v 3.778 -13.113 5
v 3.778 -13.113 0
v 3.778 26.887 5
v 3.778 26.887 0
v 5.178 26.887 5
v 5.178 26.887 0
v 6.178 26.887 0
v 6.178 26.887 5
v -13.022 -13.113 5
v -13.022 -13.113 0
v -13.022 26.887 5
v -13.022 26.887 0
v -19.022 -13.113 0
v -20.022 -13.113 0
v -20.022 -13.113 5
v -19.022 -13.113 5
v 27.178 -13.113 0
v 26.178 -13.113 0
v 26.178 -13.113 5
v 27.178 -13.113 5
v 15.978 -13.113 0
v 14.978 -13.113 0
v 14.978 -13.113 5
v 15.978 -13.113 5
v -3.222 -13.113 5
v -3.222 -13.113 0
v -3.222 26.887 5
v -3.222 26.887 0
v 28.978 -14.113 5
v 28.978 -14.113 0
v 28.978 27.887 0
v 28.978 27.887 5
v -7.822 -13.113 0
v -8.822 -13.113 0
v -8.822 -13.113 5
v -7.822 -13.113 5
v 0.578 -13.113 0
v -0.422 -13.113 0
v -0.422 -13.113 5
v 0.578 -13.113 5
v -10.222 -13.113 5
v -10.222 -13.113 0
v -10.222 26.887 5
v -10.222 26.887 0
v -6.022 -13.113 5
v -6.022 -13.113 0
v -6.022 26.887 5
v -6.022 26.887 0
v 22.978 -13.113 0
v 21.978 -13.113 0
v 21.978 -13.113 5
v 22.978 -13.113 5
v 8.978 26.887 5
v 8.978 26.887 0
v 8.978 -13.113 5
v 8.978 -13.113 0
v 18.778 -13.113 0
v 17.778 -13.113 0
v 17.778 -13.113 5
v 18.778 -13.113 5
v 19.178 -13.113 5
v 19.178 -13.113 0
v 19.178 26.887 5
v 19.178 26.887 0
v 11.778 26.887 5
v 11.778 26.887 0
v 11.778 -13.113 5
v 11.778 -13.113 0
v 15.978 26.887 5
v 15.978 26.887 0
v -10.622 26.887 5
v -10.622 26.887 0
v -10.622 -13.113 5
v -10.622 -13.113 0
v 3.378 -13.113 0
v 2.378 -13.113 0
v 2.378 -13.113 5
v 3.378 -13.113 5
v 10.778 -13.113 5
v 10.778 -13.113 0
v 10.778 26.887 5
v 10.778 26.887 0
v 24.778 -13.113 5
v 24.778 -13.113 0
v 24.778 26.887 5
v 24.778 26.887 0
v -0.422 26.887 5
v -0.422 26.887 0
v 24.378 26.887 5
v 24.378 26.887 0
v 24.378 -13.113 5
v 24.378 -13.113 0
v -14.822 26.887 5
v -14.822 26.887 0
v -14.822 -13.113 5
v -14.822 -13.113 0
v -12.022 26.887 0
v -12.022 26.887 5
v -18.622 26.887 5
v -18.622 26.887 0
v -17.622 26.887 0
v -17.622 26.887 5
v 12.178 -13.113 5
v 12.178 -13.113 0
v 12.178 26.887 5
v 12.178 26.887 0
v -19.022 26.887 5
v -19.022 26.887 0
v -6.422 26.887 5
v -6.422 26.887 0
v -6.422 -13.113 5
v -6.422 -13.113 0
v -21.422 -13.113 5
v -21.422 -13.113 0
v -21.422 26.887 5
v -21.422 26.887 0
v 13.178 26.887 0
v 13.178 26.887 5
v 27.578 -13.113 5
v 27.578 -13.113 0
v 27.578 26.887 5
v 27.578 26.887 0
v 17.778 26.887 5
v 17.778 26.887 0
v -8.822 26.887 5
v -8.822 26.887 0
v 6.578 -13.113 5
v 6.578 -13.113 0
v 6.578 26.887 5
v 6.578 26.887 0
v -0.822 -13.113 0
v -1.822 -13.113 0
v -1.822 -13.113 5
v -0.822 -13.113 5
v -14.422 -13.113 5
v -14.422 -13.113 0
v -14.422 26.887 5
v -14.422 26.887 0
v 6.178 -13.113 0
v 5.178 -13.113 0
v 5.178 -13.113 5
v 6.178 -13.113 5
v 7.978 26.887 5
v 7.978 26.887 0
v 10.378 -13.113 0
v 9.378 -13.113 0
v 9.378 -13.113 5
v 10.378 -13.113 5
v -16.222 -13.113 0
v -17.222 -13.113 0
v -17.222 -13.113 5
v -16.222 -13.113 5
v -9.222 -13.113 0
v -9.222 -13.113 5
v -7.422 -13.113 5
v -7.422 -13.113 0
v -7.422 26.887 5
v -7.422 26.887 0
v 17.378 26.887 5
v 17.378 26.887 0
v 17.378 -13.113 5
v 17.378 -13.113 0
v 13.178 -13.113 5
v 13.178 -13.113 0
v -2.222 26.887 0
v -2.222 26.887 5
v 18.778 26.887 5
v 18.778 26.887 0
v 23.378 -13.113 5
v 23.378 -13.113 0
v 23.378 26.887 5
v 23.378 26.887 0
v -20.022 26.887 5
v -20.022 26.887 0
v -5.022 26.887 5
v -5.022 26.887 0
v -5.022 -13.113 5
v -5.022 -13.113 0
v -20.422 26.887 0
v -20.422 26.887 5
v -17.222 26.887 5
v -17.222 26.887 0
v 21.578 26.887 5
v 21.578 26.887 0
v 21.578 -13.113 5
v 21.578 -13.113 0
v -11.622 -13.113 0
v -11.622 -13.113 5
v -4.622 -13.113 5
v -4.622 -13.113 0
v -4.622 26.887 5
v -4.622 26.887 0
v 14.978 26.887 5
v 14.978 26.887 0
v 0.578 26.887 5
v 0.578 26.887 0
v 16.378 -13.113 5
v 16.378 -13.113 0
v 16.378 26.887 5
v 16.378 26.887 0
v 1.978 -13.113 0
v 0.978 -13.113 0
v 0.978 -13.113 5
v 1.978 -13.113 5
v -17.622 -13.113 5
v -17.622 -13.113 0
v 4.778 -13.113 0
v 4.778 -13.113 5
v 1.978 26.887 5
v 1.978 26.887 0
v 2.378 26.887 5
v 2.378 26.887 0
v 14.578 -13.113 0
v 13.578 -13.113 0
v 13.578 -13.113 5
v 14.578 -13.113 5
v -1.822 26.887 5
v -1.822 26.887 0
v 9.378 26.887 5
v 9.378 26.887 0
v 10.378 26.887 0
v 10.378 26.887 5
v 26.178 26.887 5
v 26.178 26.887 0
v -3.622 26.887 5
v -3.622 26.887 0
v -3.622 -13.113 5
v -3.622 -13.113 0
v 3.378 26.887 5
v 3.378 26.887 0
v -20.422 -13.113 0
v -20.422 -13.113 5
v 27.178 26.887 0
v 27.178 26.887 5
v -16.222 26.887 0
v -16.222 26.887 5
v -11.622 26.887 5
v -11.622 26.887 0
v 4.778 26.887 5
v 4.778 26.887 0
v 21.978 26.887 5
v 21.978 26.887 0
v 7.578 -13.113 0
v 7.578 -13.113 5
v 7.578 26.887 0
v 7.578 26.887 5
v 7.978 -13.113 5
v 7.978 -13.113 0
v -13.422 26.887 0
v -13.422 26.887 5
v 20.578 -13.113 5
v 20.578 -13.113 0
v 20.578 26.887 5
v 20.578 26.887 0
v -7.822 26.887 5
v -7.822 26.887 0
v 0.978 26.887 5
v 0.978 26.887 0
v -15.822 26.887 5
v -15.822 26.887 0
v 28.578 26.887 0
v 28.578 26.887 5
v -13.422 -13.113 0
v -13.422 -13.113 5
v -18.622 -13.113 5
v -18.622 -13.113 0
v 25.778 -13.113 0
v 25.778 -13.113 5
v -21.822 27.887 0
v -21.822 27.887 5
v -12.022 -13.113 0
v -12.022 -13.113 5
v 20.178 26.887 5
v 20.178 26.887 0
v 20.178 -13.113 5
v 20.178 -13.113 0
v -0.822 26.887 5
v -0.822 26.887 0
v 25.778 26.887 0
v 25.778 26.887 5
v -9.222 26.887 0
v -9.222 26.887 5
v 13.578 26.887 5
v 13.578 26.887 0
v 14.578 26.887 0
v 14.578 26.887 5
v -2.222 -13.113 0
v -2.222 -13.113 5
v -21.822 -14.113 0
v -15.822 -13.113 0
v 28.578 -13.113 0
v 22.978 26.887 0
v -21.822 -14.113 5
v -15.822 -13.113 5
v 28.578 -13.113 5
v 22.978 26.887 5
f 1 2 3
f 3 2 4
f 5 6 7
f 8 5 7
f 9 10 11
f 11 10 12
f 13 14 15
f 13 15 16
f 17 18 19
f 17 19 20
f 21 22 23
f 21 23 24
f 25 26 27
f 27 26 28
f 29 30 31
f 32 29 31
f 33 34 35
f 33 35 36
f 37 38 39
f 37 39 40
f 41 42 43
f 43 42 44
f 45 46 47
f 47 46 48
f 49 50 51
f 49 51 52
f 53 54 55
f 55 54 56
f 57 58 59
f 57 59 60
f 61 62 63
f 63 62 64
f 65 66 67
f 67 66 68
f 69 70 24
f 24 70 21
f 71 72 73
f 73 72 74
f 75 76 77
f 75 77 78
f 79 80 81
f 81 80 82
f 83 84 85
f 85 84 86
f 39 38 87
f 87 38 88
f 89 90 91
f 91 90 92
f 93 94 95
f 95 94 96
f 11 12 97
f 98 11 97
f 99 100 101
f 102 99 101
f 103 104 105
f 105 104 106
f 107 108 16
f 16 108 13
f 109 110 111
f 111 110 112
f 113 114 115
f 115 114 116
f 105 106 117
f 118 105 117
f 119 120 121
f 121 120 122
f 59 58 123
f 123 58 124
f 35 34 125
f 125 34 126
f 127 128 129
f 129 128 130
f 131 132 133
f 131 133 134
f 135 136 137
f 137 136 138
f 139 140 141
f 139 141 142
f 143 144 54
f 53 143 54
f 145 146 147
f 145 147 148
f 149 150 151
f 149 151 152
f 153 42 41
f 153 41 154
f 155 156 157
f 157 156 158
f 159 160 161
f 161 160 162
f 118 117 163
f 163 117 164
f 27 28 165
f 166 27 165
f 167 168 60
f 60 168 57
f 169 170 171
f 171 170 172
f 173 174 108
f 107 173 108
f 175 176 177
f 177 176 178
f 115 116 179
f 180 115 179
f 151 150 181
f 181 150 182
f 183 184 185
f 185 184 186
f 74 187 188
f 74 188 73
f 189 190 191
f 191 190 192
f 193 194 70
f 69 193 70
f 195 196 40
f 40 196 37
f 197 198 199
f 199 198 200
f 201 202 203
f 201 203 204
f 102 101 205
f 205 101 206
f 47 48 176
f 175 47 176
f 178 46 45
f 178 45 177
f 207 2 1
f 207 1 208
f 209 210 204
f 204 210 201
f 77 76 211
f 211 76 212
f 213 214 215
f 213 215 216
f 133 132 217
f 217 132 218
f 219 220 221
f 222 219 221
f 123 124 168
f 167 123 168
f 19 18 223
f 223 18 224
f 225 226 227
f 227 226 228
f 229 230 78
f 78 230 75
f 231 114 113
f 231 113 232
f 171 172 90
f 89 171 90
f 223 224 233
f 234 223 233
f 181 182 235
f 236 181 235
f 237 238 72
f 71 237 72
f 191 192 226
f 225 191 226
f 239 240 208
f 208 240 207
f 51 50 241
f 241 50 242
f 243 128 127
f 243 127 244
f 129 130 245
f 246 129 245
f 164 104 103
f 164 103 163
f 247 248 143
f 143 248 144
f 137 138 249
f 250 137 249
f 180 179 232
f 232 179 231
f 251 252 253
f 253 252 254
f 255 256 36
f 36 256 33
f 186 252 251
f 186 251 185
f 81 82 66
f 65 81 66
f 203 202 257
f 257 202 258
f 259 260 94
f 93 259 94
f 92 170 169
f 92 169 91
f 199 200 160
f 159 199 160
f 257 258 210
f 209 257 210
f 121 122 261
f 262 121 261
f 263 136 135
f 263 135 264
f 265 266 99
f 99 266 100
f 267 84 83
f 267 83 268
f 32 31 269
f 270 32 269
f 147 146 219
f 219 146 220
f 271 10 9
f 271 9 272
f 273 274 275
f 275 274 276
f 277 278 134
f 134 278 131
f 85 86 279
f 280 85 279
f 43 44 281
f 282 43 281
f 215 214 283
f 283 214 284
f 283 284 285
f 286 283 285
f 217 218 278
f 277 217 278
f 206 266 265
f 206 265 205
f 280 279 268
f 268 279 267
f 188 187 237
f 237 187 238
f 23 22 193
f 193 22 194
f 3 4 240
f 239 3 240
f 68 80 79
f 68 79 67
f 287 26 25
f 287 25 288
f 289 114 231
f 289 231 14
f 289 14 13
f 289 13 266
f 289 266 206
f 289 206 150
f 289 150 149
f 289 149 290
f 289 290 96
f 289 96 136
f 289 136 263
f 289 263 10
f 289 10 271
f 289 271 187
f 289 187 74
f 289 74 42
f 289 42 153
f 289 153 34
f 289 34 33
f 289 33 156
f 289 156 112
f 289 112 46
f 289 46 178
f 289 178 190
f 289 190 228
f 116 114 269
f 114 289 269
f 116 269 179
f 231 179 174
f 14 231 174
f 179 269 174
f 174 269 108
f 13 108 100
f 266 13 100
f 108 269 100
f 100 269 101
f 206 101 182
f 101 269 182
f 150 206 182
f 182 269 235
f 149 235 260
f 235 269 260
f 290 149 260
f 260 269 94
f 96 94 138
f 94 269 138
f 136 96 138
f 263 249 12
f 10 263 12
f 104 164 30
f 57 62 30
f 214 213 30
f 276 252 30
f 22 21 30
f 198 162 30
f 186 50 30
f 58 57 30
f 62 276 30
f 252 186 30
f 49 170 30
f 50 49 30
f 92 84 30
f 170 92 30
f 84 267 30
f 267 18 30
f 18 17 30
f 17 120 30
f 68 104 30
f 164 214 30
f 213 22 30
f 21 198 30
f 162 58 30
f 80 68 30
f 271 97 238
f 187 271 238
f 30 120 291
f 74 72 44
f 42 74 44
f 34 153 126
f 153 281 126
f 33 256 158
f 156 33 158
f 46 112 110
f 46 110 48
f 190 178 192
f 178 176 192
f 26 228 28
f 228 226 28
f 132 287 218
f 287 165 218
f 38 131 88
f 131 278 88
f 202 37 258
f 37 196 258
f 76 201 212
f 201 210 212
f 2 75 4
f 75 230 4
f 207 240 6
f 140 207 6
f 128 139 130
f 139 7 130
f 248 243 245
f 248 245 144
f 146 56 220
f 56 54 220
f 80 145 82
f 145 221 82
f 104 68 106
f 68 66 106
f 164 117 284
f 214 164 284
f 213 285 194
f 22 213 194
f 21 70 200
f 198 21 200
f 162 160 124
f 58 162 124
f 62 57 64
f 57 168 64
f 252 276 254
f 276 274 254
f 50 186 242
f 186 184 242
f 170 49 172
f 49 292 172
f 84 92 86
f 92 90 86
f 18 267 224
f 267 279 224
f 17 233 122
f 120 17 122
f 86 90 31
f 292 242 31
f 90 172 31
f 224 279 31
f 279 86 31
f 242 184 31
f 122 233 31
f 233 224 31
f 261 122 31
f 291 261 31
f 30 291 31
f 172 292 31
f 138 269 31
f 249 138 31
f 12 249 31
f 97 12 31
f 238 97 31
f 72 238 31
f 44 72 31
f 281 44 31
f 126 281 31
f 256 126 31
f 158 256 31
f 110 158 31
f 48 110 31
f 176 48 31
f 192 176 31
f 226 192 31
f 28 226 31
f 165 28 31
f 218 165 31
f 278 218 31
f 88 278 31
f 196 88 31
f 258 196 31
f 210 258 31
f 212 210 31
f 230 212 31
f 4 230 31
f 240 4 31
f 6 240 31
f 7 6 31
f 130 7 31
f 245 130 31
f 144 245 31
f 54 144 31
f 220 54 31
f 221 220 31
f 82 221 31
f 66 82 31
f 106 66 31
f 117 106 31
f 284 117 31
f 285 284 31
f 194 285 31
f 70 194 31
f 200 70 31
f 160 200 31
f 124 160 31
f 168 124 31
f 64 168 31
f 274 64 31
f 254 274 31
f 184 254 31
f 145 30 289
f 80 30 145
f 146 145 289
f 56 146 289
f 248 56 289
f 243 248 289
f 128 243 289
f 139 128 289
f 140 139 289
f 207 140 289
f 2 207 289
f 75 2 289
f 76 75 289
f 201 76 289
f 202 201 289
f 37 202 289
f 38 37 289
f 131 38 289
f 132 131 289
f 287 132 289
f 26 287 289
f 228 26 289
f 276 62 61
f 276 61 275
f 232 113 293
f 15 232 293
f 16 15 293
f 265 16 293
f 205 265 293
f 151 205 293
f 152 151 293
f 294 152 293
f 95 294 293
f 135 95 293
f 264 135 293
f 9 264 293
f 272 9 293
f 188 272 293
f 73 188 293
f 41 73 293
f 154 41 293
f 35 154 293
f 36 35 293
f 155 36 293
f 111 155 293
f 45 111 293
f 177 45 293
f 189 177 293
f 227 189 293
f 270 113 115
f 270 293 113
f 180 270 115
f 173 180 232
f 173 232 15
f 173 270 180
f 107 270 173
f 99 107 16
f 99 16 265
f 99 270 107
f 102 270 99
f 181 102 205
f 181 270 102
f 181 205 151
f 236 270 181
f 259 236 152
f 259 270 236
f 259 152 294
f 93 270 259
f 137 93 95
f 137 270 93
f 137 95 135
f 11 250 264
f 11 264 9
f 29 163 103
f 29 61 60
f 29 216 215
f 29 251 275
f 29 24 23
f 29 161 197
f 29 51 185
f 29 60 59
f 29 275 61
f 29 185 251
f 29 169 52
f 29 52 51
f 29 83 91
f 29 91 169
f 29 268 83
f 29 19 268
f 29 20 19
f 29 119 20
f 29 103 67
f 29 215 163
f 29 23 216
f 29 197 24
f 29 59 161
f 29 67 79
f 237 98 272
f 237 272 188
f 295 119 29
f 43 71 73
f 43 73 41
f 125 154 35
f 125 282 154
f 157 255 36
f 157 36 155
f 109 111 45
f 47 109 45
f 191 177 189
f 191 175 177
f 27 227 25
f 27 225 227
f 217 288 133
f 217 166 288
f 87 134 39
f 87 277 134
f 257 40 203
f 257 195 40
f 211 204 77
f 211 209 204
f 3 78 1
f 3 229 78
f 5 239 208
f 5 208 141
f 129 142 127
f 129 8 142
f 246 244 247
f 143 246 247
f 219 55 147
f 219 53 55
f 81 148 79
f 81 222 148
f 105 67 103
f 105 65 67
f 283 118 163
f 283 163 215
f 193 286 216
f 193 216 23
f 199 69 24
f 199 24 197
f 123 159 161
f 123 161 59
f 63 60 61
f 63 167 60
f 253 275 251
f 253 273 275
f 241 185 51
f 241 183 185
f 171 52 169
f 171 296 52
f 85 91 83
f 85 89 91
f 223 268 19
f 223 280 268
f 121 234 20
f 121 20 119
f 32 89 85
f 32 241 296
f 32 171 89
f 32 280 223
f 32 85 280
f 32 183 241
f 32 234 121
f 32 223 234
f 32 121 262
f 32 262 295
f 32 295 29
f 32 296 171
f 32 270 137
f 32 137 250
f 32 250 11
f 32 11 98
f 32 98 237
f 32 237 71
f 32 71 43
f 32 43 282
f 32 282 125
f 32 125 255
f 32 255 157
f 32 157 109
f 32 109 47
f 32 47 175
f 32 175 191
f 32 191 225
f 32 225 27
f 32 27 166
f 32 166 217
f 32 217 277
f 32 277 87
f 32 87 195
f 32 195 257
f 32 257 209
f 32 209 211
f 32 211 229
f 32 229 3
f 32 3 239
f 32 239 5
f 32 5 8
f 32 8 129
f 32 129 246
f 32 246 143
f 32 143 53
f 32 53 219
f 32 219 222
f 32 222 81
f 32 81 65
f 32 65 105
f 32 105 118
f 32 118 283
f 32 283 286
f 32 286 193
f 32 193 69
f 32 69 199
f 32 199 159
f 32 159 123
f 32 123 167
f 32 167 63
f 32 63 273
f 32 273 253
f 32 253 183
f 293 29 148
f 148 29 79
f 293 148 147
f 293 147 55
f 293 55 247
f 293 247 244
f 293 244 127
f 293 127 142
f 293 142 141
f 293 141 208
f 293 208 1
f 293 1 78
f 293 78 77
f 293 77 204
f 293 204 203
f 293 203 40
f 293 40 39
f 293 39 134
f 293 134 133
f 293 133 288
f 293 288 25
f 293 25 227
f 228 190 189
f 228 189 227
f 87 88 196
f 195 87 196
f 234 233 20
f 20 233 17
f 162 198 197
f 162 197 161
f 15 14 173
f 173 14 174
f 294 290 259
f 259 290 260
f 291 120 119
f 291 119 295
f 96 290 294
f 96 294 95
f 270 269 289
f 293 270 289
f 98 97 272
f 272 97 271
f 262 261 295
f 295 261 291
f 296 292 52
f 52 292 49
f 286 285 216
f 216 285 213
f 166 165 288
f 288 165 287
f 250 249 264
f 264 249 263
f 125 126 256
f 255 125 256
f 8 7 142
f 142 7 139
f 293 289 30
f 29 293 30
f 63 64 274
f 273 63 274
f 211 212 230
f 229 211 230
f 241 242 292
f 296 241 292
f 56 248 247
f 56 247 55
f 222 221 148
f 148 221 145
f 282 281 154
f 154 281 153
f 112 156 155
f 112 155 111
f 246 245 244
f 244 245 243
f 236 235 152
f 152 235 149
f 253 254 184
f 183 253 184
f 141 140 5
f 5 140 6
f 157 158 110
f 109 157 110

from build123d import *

# Parameters (mm, degrees)
F0_W     = 0.4
F0_H     = 1
F0_W_2   = 1
F1_DEPTH = 5


with BuildPart() as f1:
    # F0 (on Top) → F1 (new body)
    with BuildSketch(Plane.XY):
        Polygon((28.977659, 27.887268), (-21.822341, 27.887268), (-21.822341, -13.112732), (-21.422341, -13.112732), (-21.422341, 26.887268), (-20.422341, 26.887268), (-20.422341, -13.112732), (-20.022341, -13.112732), (-20.022341, 26.887268), (-19.022341, 26.887268), (-19.022341, -13.112732), (-18.622341, -13.112732), (-18.622341, 26.887268), (-17.622341, 26.887268), (-17.622341, -13.112732), (-17.222341, -13.112732), (-17.222341, 26.887268), (-16.222341, 26.887268), (-16.222341, -13.112732), (-15.822341, -13.112732), (-15.822341, 26.887268), (-14.822341, 26.887268), (-14.822341, -13.112732), (-14.422341, -13.112732), (-14.422341, 26.887268), (-13.422341, 26.887268), (-13.422341, -13.112732), (-13.022341, -13.112732), (-13.022341, 26.887268), (-12.022341, 26.887268), (-12.022341, -13.112732), (-11.622341, -13.112732), (-11.622341, 26.887268), (-10.622341, 26.887268), (-10.622341, -13.112732), (-10.222341, -13.112732), (-10.222341, 26.887268), (-9.222341, 26.887268), (-9.222341, -13.112732), (-8.822341, -13.112732), (-8.822341, 26.887268), (-7.822341, 26.887268), (-7.822341, -13.112732), (-7.422341, -13.112732), (-7.422341, 26.887268), (-6.422341, 26.887268), (-6.422341, -13.112732), (-6.022341, -13.112732), (-6.022341, 26.887268), (-5.022341, 26.887268), (-5.022341, -13.112732), (-4.622341, -13.112732), (-4.622341, 26.887268), (-3.622341, 26.887268), (-3.622341, -13.112732), (-3.222341, -13.112732), (-3.222341, 26.887268), (-2.222341, 26.887268), (-2.222341, -13.112732), (-1.822341, -13.112732), (-1.822341, 26.887268), (-0.822341, 26.887268), (-0.822341, -13.112732), (-0.422341, -13.112732), (-0.422341, 26.887268), (0.577659, 26.887268), (0.577659, -13.112732), (0.977659, -13.112732), (0.977659, 26.887268), (1.977659, 26.887268), (1.977659, -13.112732), (2.377659, -13.112732), (2.377659, 26.887268), (3.377659, 26.887268), (3.377659, -13.112732), (3.777659, -13.112732), (3.777659, 26.887268), (4.777659, 26.887268), (4.777659, -13.112732), (5.177659, -13.112732), (5.177659, 26.887268), (6.177659, 26.887268), (6.177659, -13.112732), (6.577659, -13.112732), (6.577659, 26.887268), (7.577659, 26.887268), (7.577659, -13.112732), (7.977659, -13.112732), (7.977659, 26.887268), (8.977659, 26.887268), (8.977659, -13.112732), (9.377659, -13.112732), (9.377659, 26.887268), (10.377659, 26.887268), (10.377659, -13.112732), (10.777659, -13.112732), (10.777659, 26.887268), (11.777659, 26.887268), (11.777659, -13.112732), (12.177659, -13.112732), (12.177659, 26.887268), (13.177659, 26.887268), (13.177659, -13.112732), (13.577659, -13.112732), (13.577659, 26.887268), (14.577659, 26.887268), (14.577659, -13.112732), (14.977659, -13.112732), (14.977659, 26.887268), (15.977659, 26.887268), (15.977659, -13.112732), (16.377659, -13.112732), (16.377659, 26.887268), (17.377659, 26.887268), (17.377659, -13.112732), (17.777659, -13.112732), (17.777659, 26.887268), (18.777659, 26.887268), (18.777659, -13.112732), (19.177659, -13.112732), (19.177659, 26.887268), (20.177659, 26.887268), (20.177659, -13.112732), (20.577659, -13.112732), (20.577659, 26.887268), (21.577659, 26.887268), (21.577659, -13.112732), (21.977659, -13.112732), (21.977659, 26.887268), (22.977659, 26.887268), (22.977659, -13.112732), (23.377659, -13.112732), (23.377659, 26.887268), (24.377659, 26.887268), (24.377659, -13.112732), (24.777659, -13.112732), (24.777659, 26.887268), (25.777659, 26.887268), (25.777659, -13.112732), (26.177659, -13.112732), (26.177659, 26.887268), (27.177659, 26.887268), (27.177659, -13.112732), (27.577659, -13.112732), (27.577659, 26.887268), (28.577659, 26.887268), (28.577659, -13.112732), (28.577659, -14.112732), (28.977659, -14.112732), (28.977659, 26.887268), align=None)
        with Locations((-21.622341, -13.612732)):
            Rectangle(F0_W, F0_H)
        with Locations((-20.922341, -13.612732)):
            Rectangle(F0_W_2, F0_H)
        with Locations((-20.222341, -13.612732)):
            Rectangle(F0_W, F0_H)
        with Locations((-19.522341, -13.612732)):
            Rectangle(F0_W_2, F0_H)
        with Locations((28.077659, -13.612732)):
            Rectangle(F0_W_2, F0_H)
        with Locations((-18.822341, -13.612732)):
            Rectangle(F0_W, F0_H)
        with Locations((27.377659, -13.612732)):
            Rectangle(F0_W, F0_H)
        with Locations((-18.122341, -13.612732)):
            Rectangle(F0_W_2, F0_H)
        with Locations((26.677659, -13.612732)):
            Rectangle(F0_W_2, F0_H)
        with Locations((-17.422341, -13.612732)):
            Rectangle(F0_W, F0_H)
        with Locations((25.977659, -13.612732)):
            Rectangle(F0_W, F0_H)
        with Locations((-16.722341, -13.612732)):
            Rectangle(F0_W_2, F0_H)
        with Locations((25.277659, -13.612732)):
            Rectangle(F0_W_2, F0_H)
        with Locations((-16.022341, -13.612732)):
            Rectangle(F0_W, F0_H)
        with Locations((24.577659, -13.612732)):
            Rectangle(F0_W, F0_H)
        with Locations((-15.322341, -13.612732)):
            Rectangle(F0_W_2, F0_H)
        with Locations((23.877659, -13.612732)):
            Rectangle(F0_W_2, F0_H)
        with Locations((-14.622341, -13.612732)):
            Rectangle(F0_W, F0_H)
        with Locations((23.177659, -13.612732)):
            Rectangle(F0_W, F0_H)
        with Locations((-13.922341, -13.612732)):
            Rectangle(F0_W_2, F0_H)
        with Locations((22.477659, -13.612732)):
            Rectangle(F0_W_2, F0_H)
        with Locations((-13.222341, -13.612732)):
            Rectangle(F0_W, F0_H)
        with Locations((21.777659, -13.612732)):
            Rectangle(F0_W, F0_H)
        with Locations((-12.522341, -13.612732)):
            Rectangle(F0_W_2, F0_H)
        with Locations((21.077659, -13.612732)):
            Rectangle(F0_W_2, F0_H)
        with Locations((-11.822341, -13.612732)):
            Rectangle(F0_W, F0_H)
        with Locations((20.377659, -13.612732)):
            Rectangle(F0_W, F0_H)
        with Locations((-11.122341, -13.612732)):
            Rectangle(F0_W_2, F0_H)
        with Locations((19.677659, -13.612732)):
            Rectangle(F0_W_2, F0_H)
        with Locations((-10.422341, -13.612732)):
            Rectangle(F0_W, F0_H)
        with Locations((18.977659, -13.612732)):
            Rectangle(F0_W, F0_H)
        with Locations((-9.722341, -13.612732)):
            Rectangle(F0_W_2, F0_H)
        with Locations((18.277659, -13.612732)):
            Rectangle(F0_W_2, F0_H)
        with Locations((-9.022341, -13.612732)):
            Rectangle(F0_W, F0_H)
        with Locations((17.577659, -13.612732)):
            Rectangle(F0_W, F0_H)
        with Locations((-8.322341, -13.612732)):
            Rectangle(F0_W_2, F0_H)
        with Locations((16.877659, -13.612732)):
            Rectangle(F0_W_2, F0_H)
        with Locations((-7.622341, -13.612732)):
            Rectangle(F0_W, F0_H)
        with Locations((16.177659, -13.612732)):
            Rectangle(F0_W, F0_H)
        with Locations((-6.922341, -13.612732)):
            Rectangle(F0_W_2, F0_H)
        with Locations((15.477659, -13.612732)):
            Rectangle(F0_W_2, F0_H)
        with Locations((-6.222341, -13.612732)):
            Rectangle(F0_W, F0_H)
        with Locations((14.777659, -13.612732)):
            Rectangle(F0_W, F0_H)
        with Locations((-5.522341, -13.612732)):
            Rectangle(F0_W_2, F0_H)
        with Locations((14.077659, -13.612732)):
            Rectangle(F0_W_2, F0_H)
        with Locations((-4.822341, -13.612732)):
            Rectangle(F0_W, F0_H)
        with Locations((13.377659, -13.612732)):
            Rectangle(F0_W, F0_H)
        with Locations((-4.122341, -13.612732)):
            Rectangle(F0_W_2, F0_H)
        with Locations((12.677659, -13.612732)):
            Rectangle(F0_W_2, F0_H)
        with Locations((-3.422341, -13.612732)):
            Rectangle(F0_W, F0_H)
        with Locations((11.977659, -13.612732)):
            Rectangle(F0_W, F0_H)
        with Locations((-2.722341, -13.612732)):
            Rectangle(F0_W_2, F0_H)
        with Locations((11.277659, -13.612732)):
            Rectangle(F0_W_2, F0_H)
        with Locations((-2.022341, -13.612732)):
            Rectangle(F0_W, F0_H)
        with Locations((10.577659, -13.612732)):
            Rectangle(F0_W, F0_H)
        with Locations((-1.322341, -13.612732)):
            Rectangle(F0_W_2, F0_H)
        with Locations((9.877659, -13.612732)):
            Rectangle(F0_W_2, F0_H)
        with Locations((-0.622341, -13.612732)):
            Rectangle(F0_W, F0_H)
        with Locations((9.177659, -13.612732)):
            Rectangle(F0_W, F0_H)
        with Locations((0.077659, -13.612732)):
            Rectangle(F0_W_2, F0_H)
        with Locations((8.477659, -13.612732)):
            Rectangle(F0_W_2, F0_H)
        with Locations((0.777659, -13.612732)):
            Rectangle(F0_W, F0_H)
        with Locations((7.777659, -13.612732)):
            Rectangle(F0_W, F0_H)
        with Locations((1.477659, -13.612732)):
            Rectangle(F0_W_2, F0_H)
        with Locations((7.077659, -13.612732)):
            Rectangle(F0_W_2, F0_H)
        with Locations((2.177659, -13.612732)):
            Rectangle(F0_W, F0_H)
        with Locations((6.377659, -13.612732)):
            Rectangle(F0_W, F0_H)
        with Locations((2.877659, -13.612732)):
            Rectangle(F0_W_2, F0_H)
        with Locations((5.677659, -13.612732)):
            Rectangle(F0_W_2, F0_H)
        with Locations((3.577659, -13.612732)):
            Rectangle(F0_W, F0_H)
        with Locations((4.977659, -13.612732)):
            Rectangle(F0_W, F0_H)
        with Locations((4.277659, -13.612732)):
            Rectangle(F0_W_2, F0_H)
    extrude(amount=F1_DEPTH)


solid = f1.part
